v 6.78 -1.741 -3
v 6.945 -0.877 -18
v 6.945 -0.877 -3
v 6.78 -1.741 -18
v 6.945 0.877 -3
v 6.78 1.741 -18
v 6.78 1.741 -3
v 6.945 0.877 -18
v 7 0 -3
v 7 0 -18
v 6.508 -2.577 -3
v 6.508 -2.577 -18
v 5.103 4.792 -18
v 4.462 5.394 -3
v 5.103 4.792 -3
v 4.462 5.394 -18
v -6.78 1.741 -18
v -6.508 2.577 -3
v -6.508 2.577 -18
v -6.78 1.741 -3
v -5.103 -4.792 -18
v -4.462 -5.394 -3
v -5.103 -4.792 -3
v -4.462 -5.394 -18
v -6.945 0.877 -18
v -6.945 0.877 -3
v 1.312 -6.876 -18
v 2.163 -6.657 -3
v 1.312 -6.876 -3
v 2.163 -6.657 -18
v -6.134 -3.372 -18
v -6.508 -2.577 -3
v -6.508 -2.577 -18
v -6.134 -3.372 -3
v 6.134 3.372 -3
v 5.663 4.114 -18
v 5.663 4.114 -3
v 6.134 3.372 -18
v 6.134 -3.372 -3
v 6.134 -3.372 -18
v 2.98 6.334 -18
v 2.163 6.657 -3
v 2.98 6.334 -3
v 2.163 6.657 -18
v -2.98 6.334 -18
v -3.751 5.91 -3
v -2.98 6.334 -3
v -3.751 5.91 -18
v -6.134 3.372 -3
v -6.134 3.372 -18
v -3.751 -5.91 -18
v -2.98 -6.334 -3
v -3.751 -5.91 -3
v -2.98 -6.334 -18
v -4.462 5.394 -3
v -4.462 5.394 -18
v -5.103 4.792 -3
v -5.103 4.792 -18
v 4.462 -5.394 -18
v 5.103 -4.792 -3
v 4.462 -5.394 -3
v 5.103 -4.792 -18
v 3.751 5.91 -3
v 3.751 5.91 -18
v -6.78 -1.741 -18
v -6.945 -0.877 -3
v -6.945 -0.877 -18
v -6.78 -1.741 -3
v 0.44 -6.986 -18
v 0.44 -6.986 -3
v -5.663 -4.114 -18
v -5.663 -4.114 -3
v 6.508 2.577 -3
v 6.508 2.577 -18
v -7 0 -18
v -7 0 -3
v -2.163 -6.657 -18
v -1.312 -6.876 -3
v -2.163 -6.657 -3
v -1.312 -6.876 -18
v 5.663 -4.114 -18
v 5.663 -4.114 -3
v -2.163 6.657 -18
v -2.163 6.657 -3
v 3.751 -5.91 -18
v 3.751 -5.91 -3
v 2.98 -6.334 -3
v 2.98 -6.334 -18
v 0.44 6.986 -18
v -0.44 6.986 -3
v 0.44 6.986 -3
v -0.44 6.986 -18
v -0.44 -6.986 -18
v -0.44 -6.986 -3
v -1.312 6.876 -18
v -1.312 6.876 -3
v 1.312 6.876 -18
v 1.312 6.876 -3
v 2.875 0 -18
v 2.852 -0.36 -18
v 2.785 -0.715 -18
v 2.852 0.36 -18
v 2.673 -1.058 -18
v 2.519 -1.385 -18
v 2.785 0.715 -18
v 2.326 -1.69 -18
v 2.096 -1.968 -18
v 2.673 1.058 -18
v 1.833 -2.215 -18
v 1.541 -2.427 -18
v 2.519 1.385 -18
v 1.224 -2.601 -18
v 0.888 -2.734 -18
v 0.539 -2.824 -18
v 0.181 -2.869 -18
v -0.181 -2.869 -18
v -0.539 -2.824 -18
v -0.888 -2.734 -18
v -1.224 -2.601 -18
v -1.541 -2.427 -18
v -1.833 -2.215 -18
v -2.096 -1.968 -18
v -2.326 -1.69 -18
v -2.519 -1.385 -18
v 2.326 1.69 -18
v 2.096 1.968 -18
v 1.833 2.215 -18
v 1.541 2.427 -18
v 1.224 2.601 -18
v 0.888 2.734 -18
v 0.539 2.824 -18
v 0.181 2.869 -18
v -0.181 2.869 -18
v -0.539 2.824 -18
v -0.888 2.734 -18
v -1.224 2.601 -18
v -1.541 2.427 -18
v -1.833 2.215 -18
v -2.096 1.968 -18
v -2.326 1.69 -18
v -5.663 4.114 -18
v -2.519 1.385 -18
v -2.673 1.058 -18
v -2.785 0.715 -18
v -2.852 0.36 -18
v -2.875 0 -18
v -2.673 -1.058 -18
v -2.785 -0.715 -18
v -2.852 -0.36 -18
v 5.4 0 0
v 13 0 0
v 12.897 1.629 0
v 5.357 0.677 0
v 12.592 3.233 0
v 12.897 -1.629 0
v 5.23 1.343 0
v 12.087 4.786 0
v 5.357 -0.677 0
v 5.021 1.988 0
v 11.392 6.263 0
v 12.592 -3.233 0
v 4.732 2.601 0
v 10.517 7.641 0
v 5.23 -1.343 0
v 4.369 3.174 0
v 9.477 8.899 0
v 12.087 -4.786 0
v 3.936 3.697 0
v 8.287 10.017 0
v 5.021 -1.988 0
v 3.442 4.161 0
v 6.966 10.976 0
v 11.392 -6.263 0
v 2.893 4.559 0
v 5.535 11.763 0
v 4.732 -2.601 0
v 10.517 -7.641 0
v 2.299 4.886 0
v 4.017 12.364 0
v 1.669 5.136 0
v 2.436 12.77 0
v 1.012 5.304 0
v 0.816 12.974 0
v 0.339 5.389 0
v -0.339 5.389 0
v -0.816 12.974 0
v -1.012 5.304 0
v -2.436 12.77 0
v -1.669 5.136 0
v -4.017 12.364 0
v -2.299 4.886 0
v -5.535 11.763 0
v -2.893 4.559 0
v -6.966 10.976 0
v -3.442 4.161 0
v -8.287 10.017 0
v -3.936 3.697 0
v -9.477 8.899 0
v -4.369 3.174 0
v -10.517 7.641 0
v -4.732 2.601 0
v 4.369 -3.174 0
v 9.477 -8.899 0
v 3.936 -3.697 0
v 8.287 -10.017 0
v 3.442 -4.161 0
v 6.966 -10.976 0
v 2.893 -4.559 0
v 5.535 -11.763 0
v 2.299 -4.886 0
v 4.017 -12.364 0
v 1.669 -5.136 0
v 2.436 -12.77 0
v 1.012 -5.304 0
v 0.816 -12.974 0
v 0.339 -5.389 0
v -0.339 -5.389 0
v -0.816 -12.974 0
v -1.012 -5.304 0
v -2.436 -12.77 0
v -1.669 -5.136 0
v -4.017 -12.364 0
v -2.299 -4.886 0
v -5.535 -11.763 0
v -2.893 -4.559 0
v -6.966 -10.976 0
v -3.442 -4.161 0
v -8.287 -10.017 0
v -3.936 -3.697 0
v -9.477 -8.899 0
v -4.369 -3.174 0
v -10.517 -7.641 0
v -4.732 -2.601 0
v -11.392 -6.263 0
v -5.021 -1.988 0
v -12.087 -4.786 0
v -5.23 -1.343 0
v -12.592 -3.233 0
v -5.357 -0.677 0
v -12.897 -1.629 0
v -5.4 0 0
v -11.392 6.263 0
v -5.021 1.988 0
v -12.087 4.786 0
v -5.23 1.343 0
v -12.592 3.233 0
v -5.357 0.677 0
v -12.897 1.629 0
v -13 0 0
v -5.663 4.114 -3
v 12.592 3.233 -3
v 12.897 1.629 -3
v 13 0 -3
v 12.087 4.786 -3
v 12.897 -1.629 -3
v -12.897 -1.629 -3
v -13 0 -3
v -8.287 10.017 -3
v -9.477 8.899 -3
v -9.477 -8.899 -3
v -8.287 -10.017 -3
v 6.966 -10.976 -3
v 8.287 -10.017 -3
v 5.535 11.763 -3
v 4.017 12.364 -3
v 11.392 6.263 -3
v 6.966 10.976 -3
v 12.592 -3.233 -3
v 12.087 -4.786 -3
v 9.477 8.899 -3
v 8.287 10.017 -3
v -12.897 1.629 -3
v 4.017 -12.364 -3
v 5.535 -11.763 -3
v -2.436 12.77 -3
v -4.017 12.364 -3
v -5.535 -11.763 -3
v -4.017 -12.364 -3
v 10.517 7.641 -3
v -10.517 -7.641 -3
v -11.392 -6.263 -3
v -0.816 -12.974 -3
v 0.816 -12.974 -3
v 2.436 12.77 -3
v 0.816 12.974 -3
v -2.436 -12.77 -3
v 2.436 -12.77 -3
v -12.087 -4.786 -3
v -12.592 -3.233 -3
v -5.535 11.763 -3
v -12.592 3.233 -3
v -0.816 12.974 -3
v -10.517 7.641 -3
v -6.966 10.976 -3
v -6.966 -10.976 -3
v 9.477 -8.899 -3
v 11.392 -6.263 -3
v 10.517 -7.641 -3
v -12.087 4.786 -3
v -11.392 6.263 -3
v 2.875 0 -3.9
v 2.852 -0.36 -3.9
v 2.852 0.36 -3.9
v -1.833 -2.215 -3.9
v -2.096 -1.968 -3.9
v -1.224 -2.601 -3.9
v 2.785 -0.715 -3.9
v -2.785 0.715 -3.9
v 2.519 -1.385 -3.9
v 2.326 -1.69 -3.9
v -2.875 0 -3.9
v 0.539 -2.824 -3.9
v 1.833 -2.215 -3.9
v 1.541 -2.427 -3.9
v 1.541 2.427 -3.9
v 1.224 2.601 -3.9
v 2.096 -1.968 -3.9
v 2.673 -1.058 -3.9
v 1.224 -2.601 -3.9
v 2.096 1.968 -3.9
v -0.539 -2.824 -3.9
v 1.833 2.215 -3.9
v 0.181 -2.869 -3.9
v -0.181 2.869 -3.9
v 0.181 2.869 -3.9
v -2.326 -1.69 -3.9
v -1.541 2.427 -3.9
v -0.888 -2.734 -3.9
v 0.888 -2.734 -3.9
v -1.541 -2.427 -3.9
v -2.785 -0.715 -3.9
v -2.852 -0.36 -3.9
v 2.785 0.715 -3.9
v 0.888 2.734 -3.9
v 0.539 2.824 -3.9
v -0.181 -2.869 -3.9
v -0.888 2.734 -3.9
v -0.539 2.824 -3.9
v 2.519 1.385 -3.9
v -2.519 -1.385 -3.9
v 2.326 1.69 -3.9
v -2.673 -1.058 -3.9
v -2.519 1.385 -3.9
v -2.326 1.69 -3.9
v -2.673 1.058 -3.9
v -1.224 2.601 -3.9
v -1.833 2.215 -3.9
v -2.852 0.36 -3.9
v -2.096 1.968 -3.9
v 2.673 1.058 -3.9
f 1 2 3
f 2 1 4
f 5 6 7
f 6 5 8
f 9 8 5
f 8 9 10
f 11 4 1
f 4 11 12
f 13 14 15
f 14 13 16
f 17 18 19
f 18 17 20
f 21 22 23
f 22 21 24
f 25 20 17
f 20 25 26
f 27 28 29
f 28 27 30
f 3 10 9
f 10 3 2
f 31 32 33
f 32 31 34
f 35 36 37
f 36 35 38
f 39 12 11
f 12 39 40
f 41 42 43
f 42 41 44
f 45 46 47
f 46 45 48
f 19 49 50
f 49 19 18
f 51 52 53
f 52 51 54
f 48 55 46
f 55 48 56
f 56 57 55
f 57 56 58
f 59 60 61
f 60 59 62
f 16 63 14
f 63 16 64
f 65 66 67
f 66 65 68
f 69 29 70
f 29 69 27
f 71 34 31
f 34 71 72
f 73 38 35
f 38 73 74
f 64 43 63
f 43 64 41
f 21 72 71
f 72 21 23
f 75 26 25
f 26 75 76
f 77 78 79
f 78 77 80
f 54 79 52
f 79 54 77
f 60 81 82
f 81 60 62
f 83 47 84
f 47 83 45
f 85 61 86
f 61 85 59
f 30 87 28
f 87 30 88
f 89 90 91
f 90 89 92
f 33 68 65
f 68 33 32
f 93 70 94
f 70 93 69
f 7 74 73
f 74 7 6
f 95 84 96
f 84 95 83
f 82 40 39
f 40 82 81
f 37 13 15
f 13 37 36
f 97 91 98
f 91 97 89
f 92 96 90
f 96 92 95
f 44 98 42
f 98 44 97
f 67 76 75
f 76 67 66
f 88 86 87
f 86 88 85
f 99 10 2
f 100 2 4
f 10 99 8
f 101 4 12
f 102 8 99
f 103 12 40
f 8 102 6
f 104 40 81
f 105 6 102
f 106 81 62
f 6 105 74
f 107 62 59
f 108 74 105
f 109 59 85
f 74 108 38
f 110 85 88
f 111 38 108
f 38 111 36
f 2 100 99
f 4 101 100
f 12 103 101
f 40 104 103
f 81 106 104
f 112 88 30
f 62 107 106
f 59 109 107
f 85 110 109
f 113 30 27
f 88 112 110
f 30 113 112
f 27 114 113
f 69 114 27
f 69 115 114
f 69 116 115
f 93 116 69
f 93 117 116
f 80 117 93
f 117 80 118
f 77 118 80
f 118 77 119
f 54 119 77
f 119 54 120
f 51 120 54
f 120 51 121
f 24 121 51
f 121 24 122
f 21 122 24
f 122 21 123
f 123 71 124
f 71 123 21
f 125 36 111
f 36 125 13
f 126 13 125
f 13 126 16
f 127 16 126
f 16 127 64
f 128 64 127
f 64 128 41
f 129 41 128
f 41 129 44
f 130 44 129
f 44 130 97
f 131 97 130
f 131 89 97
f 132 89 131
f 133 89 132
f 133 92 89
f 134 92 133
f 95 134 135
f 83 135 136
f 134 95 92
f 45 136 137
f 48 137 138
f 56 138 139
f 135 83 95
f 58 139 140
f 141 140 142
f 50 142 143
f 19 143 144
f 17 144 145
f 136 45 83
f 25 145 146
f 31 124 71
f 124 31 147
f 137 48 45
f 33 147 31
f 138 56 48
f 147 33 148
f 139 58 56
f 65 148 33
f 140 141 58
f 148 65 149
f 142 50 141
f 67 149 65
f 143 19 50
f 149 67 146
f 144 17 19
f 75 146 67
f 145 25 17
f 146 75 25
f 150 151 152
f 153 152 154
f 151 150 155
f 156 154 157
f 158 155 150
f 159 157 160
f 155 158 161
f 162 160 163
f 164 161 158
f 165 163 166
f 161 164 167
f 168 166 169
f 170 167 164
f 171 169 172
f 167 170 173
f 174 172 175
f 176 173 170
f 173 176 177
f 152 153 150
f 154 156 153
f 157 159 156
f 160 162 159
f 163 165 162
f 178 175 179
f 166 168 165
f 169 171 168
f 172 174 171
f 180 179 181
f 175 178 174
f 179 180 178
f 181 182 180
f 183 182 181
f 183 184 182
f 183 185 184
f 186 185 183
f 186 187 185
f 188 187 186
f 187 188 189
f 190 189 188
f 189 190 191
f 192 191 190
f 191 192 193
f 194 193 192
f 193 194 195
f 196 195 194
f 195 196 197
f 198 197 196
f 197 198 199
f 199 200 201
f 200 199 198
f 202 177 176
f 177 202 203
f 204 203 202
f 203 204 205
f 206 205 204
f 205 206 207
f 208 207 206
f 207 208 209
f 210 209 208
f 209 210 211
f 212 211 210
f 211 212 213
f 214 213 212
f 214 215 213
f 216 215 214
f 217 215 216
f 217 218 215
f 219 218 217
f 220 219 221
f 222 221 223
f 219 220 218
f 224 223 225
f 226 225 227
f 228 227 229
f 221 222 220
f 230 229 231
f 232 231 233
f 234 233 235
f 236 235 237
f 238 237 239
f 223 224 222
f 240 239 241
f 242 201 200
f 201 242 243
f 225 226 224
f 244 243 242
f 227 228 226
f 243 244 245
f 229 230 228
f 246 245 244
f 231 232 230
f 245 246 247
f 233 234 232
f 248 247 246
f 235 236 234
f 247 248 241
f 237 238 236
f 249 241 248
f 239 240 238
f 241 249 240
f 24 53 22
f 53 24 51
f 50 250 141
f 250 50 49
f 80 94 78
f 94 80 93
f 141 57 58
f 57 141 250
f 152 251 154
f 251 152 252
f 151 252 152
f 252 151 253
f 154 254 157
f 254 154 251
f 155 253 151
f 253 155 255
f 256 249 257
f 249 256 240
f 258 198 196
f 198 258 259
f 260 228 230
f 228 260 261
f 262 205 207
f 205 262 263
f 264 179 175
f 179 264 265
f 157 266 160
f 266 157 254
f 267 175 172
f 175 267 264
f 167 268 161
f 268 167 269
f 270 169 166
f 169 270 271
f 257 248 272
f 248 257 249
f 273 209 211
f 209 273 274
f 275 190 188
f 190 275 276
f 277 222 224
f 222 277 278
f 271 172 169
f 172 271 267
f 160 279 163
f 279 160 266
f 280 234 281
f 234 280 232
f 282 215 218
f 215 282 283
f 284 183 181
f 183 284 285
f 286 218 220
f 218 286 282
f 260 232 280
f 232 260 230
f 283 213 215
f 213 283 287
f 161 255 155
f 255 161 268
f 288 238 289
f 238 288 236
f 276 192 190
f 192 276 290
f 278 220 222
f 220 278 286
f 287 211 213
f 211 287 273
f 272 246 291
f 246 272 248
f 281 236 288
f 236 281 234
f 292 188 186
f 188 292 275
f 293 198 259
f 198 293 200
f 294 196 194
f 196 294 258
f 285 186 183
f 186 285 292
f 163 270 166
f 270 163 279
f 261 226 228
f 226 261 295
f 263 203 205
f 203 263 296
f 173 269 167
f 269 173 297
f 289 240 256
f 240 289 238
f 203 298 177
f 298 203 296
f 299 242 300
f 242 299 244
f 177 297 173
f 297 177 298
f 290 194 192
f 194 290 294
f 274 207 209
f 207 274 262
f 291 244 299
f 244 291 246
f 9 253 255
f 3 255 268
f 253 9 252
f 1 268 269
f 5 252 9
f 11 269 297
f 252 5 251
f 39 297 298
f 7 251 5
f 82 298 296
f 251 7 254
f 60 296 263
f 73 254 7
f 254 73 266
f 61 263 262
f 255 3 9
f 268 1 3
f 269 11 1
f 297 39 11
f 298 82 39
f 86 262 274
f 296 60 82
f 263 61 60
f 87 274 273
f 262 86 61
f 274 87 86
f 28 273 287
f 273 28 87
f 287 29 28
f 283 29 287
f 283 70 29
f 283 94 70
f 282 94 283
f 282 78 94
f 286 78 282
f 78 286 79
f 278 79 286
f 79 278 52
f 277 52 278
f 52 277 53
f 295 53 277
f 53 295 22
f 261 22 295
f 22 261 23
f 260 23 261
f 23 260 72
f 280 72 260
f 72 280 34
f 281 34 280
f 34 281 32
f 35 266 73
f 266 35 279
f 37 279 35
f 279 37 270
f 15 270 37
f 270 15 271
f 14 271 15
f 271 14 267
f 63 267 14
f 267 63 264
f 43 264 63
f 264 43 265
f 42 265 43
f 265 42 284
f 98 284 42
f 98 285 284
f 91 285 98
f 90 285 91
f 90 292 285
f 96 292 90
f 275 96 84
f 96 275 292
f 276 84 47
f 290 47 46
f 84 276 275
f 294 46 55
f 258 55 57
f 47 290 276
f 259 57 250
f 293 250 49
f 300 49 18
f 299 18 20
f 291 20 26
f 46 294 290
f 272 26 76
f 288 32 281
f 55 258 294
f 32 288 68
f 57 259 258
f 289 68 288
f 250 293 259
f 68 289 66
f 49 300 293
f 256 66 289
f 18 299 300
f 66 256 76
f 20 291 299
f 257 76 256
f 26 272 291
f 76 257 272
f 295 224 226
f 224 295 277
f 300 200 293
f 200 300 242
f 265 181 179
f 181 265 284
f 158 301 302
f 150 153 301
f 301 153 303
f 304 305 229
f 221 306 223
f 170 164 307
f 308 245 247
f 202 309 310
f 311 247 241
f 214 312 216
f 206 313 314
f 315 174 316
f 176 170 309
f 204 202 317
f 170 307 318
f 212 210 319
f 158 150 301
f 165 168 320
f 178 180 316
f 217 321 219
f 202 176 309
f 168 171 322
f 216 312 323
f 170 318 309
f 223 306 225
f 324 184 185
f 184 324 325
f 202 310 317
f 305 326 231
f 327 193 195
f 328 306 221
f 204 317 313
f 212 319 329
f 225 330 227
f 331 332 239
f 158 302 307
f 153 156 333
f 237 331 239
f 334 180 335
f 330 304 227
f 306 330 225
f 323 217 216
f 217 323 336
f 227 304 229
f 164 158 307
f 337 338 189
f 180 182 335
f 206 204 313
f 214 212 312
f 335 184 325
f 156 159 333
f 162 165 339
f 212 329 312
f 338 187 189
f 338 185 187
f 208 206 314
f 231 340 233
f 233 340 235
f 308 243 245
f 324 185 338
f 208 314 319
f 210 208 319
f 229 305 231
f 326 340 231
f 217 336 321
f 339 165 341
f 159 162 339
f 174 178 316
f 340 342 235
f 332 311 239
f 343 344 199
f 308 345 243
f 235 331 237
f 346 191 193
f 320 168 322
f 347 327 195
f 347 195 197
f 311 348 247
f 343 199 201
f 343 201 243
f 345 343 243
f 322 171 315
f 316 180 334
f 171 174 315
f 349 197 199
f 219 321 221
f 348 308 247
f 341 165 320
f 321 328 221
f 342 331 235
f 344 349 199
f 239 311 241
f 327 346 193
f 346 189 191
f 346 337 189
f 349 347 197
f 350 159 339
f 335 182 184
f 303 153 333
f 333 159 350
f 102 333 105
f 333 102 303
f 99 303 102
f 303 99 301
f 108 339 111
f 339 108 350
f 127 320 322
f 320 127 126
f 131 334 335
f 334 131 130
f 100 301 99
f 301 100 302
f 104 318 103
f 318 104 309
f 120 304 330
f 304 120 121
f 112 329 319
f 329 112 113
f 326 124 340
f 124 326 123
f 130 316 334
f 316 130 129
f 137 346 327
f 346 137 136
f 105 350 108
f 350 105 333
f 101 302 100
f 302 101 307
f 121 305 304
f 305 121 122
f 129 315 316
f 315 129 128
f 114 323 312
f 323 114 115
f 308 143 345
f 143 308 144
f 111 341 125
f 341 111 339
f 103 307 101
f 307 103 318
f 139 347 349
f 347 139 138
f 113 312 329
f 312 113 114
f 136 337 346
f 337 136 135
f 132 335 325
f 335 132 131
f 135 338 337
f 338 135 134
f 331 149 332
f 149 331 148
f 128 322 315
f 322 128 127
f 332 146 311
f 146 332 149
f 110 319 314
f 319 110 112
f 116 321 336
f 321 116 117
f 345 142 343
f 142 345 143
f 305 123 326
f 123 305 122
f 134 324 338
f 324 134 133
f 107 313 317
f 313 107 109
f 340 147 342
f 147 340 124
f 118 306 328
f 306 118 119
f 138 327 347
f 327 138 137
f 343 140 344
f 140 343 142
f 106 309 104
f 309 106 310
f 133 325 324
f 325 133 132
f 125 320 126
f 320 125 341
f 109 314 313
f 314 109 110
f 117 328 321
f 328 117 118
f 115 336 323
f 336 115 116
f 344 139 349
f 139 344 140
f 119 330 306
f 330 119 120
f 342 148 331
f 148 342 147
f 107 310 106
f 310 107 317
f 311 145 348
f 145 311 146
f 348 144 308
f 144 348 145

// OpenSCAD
$fn = 50;


difference() {
	union() {
		translate(v = [0, 0, -18.0000000000]) {
			cylinder(h = 18, r = 7.0000000000);
		}
		translate(v = [0, 0, -3.0000000000]) {
			cylinder(h = 3, r = 13.0000000000);
		}
	}
	union() {
		translate(v = [0, 0, 0]) {
			rotate(a = [0, 0, 0]) {
				difference() {
					union() {
						#translate(v = [0, 0, -18.0000000000]) {
							cylinder(h = 18, r = 2.6000000000);
						}
						#translate(v = [0, 0, -3.9000000000]) {
							cylinder(h = 3.9000000000, r = 7.0000000000, r1 = 2.8750000000, r2 = 5.4000000000);
						}
						#translate(v = [0, 0, -18.0000000000]) {
							cylinder(h = 18, r = 2.8750000000);
						}
						#translate(v = [0, 0, -18.0000000000]) {
							cylinder(h = 18, r = 2.6000000000);
						}
					}
					union();
				}
			}
		}
	}
}
